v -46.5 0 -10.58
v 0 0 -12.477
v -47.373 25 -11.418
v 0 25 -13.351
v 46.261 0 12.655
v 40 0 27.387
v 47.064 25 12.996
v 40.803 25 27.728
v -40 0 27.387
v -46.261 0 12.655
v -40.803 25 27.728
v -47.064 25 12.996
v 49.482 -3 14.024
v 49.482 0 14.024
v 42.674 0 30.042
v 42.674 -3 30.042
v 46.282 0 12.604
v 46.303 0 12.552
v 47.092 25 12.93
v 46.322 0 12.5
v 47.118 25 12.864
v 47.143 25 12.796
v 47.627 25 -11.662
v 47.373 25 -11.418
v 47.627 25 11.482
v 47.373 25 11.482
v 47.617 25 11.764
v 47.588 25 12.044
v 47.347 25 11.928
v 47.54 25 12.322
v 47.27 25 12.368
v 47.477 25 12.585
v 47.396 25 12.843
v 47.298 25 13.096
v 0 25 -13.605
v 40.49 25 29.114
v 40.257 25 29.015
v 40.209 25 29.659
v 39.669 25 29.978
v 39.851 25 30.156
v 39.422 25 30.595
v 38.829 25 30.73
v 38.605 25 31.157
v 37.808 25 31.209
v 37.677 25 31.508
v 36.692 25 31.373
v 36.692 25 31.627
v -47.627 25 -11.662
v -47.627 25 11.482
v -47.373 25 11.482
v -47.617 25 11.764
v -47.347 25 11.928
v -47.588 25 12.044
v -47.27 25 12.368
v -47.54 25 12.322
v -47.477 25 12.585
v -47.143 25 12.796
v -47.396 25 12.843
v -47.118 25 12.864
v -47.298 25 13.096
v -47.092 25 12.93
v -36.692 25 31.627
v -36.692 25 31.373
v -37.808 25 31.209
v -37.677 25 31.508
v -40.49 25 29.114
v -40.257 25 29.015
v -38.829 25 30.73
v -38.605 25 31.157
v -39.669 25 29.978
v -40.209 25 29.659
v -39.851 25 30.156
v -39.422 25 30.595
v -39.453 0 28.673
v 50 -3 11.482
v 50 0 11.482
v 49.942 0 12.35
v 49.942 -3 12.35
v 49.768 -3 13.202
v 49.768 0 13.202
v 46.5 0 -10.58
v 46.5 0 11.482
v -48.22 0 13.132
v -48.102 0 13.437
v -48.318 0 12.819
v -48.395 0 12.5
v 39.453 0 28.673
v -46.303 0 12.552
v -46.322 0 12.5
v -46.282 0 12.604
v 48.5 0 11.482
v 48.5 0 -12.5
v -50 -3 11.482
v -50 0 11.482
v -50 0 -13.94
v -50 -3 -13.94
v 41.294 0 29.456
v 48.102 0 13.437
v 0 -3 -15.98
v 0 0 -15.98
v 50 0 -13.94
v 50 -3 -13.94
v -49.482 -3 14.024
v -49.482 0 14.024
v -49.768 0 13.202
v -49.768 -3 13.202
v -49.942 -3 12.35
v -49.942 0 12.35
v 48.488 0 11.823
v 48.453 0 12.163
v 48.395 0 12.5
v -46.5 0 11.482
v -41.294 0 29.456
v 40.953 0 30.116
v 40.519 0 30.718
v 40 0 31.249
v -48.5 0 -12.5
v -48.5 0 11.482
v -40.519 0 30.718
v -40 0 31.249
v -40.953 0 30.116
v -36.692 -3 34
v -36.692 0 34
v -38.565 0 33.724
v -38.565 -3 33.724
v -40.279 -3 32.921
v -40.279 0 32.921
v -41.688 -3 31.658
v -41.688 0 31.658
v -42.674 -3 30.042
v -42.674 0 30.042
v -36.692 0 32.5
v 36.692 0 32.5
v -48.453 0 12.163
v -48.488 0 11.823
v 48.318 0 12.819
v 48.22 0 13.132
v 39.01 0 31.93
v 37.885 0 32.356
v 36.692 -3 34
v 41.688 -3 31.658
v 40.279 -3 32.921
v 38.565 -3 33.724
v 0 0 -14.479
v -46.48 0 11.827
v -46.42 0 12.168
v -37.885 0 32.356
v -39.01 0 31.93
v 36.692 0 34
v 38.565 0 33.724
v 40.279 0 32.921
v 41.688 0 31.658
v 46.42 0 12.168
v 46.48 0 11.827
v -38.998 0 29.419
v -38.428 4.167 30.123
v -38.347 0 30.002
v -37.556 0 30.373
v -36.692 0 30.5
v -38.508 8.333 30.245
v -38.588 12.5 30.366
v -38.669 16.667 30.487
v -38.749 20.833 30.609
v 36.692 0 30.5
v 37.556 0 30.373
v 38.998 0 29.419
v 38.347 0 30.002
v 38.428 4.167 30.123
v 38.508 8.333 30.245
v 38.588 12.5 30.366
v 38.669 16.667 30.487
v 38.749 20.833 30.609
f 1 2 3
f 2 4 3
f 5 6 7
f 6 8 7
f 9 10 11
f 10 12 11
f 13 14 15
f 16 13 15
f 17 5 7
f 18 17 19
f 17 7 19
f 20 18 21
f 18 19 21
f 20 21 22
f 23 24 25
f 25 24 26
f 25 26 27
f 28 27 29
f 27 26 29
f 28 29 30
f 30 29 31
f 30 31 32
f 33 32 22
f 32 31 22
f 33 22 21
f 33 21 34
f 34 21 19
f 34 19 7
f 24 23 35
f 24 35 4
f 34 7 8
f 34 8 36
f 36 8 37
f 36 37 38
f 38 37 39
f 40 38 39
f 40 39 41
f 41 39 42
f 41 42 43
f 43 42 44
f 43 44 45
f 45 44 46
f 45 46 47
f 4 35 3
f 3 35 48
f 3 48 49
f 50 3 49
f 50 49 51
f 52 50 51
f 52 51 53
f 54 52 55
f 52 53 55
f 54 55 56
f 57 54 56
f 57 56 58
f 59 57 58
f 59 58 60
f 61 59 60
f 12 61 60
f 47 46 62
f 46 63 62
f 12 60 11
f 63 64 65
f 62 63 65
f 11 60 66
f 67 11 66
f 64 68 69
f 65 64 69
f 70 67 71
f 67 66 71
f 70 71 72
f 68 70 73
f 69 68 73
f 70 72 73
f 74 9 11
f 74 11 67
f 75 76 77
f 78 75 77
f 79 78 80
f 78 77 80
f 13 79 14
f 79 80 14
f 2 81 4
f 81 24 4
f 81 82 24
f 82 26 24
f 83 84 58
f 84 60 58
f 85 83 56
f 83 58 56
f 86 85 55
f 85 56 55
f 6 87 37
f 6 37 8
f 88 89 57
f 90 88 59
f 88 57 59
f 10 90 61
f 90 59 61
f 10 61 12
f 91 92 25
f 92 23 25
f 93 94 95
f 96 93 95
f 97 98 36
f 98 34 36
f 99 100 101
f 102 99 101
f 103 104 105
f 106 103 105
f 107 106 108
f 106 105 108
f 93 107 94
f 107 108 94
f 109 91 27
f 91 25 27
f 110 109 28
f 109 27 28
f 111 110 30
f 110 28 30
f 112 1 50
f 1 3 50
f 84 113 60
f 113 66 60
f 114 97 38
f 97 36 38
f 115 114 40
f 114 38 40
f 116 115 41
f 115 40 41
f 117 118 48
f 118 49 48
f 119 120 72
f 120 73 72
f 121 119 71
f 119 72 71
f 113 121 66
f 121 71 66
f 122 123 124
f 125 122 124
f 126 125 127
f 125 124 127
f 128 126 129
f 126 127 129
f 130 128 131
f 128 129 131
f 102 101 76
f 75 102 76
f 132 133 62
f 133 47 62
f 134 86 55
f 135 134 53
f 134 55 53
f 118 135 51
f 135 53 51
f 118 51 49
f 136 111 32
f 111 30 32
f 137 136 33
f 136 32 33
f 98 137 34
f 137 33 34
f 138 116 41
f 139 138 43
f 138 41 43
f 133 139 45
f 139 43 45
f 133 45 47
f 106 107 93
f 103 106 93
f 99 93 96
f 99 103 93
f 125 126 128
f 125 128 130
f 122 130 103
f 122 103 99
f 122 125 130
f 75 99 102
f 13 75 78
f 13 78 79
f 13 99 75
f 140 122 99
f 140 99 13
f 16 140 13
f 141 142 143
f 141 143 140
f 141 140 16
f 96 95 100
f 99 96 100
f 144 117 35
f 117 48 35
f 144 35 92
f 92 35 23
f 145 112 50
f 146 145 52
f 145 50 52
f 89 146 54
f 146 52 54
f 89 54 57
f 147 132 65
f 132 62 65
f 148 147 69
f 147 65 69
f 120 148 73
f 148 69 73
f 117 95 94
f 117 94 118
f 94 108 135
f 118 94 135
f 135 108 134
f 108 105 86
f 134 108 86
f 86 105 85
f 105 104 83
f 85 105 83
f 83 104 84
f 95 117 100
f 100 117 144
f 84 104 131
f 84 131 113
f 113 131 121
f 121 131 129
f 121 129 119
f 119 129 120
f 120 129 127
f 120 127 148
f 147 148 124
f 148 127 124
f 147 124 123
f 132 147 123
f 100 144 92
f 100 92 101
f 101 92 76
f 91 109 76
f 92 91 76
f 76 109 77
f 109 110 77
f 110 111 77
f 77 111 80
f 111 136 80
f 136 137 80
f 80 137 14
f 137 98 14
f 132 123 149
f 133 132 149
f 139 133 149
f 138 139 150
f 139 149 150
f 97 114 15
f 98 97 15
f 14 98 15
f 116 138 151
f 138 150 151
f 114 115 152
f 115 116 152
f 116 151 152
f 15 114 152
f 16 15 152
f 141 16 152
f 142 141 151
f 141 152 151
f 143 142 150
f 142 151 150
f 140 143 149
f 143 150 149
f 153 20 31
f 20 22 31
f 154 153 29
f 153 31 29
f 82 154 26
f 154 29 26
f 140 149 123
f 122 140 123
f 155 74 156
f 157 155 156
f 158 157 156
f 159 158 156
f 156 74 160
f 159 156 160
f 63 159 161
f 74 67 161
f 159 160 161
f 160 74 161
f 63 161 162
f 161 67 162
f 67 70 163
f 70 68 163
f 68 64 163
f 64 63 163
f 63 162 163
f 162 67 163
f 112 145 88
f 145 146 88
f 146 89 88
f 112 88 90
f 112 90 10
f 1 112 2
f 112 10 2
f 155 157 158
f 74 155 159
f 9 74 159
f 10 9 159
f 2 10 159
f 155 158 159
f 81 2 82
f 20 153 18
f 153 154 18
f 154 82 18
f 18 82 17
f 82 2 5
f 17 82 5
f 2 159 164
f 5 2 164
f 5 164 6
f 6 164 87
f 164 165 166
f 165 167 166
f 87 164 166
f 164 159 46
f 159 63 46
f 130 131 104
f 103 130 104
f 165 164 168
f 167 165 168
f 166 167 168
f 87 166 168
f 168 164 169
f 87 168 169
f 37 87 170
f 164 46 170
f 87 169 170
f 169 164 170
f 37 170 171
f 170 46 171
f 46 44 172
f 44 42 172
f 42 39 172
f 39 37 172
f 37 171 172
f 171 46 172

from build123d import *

# Parameters (mm, degrees)
F1_DEPTH = 3
F2_DEPTH = 25
F2_TAPER = 2


with BuildPart() as f1:
    # F0 (on Front) → F1 (new body)
    with BuildSketch(Plane.XZ):
        with BuildLine():
            Line((-50, -13.9400455604), (0, -15.9801289749))
            Line((0, -15.9801289749), (50, -13.9400455604))
            Line((50, -13.9400455604), (50, 11.4815801105))
            ThreePointArc((50, 11.4815801105), (49.8692221387, 12.7788886118), (49.48215097, 14.0239942728))
            Line((49.48215097, 14.0239942728), (42.674322517, 30.0424141622))
            ThreePointArc((42.674322517, 30.0424141622), (40.2785560736, 32.9210558037), (36.692171547, 34))
            Line((36.692171547, 34), (-36.692171547, 34))
            ThreePointArc((-36.692171547, 34), (-40.2785560736, 32.9210558037), (-42.674322517, 30.0424141622))
            Line((-42.674322517, 30.0424141622), (-49.48215097, 14.0239942728))
            ThreePointArc((-49.48215097, 14.0239942728), (-49.8692221387, 12.7788886118), (-50, 11.4815801105))
            Line((-50, 11.4815801105), (-50, -13.9400455604))
        make_face()
        with BuildLine():
            Line((48.5, 11.4815801105), (48.5, -12.5))
            Line((48.5, -12.5), (0, -14.4788809121))
            Line((0, -14.4788809121), (-48.5, -12.5))
            Line((-48.5, -12.5), (-48.5, 11.4815801105))
            ThreePointArc((-48.5, 11.4815801105), (-48.4737268325, 11.9934799011), (-48.3951834418, 12.5))
            ThreePointArc((-48.3951834418, 12.5), (-48.2714890929, 12.9758665077), (-48.1016545923, 13.4372833123))
            Line((-48.1016545923, 13.4372833123), (-41.2938261393, 29.4557032017))
            ThreePointArc((-41.2938261393, 29.4557032017), (-40.7473349126, 30.4250042869), (-40, 31.249436081))
            ThreePointArc((-40, 31.249436081), (-38.4603372059, 32.1769210173), (-36.692171547, 32.5))
            Line((-36.692171547, 32.5), (0, 32.5))
            Line((0, 32.5), (36.692171547, 32.5))
            ThreePointArc((36.692171547, 32.5), (38.4603372059, 32.1769210173), (40, 31.249436081))
            ThreePointArc((40, 31.249436081), (40.7473349126, 30.4250042869), (41.2938261393, 29.4557032017))
            Line((41.2938261393, 29.4557032017), (48.1016545923, 13.4372833123))
            ThreePointArc((48.1016545923, 13.4372833123), (48.2714890929, 12.9758665077), (48.3951834418, 12.5))
            ThreePointArc((48.3951834418, 12.5), (48.4737268325, 11.9934799011), (48.5, 11.4815801105))
        make_face(mode=Mode.SUBTRACT)
        with BuildLine():
            Line((0, 12.5), (0, -12.4772168282))
            Line((0, -12.4772168282), (46.5, -10.5799392527))
            Line((46.5, -10.5799392527), (46.5, 11.4815801105))
            ThreePointArc((46.5, 11.4815801105), (46.4551261591, 11.9985224514), (46.3218470775, 12.5))
            Line((46.3218470775, 12.5), (40, 12.5))
            Line((40, 12.5), (0, 12.5))
        make_face()
        with BuildLine():
            Line((-46.5, -10.5799392527), (0, -12.4772168282))
            Line((0, -12.4772168282), (0, 12.5))
            Line((0, 12.5), (-40, 12.5))
            Line((-40, 12.5), (-46.3218470775, 12.5))
            ThreePointArc((-46.3218470775, 12.5), (-46.4551261591, 11.9985224514), (-46.5, 11.4815801105))
            Line((-46.5, 11.4815801105), (-46.5, -10.5799392527))
        make_face()
        with BuildLine():
            Line((-40, 12.5), (0, 12.5))
            Line((0, 12.5), (0, 30.5))
            Line((0, 30.5), (-36.692171547, 30.5))
            ThreePointArc((-36.692171547, 30.5), (-38.3474259439, 30.0020257556), (-39.4531643024, 28.673421921))
            Line((-39.4531643024, 28.673421921), (-40, 27.3867496913))
            Line((-40, 27.3867496913), (-40, 12.5))
        make_face()
        with BuildLine():
            Line((0, 30.5), (0, 12.5))
            Line((0, 12.5), (40, 12.5))
            Line((40, 12.5), (40, 27.3867496913))
            Line((40, 27.3867496913), (39.4531643024, 28.673421921))
            ThreePointArc((39.4531643024, 28.673421921), (38.3474259439, 30.0020257556), (36.692171547, 30.5))
            Line((36.692171547, 30.5), (0, 30.5))
        make_face()
        with BuildLine():
            Line((0, -12.5), (48.5, -12.5))
            Line((48.5, -12.5), (48.5, 11.4815801105))
            ThreePointArc((48.5, 11.4815801105), (48.4737268325, 11.9934799011), (48.3951834418, 12.5))
            Line((48.3951834418, 12.5), (46.3218470775, 12.5))
            ThreePointArc((46.3218470775, 12.5), (46.4551261591, 11.9985224514), (46.5, 11.4815801105))
            Line((46.5, 11.4815801105), (46.5, -10.5799392527))
            Line((46.5, -10.5799392527), (0, -12.4772168282))
            Line((0, -12.4772168282), (0, -12.5))
        make_face()
        with BuildLine():
            Line((-48.5, -12.5), (0, -12.5))
            Line((0, -12.5), (0, -12.4772168282))
            Line((0, -12.4772168282), (-46.5, -10.5799392527))
            Line((-46.5, -10.5799392527), (-46.5, 11.4815801105))
            ThreePointArc((-46.5, 11.4815801105), (-46.4551261591, 11.9985224514), (-46.3218470775, 12.5))
            Line((-46.3218470775, 12.5), (-48.3951834418, 12.5))
            ThreePointArc((-48.3951834418, 12.5), (-48.4737268325, 11.9934799011), (-48.5, 11.4815801105))
            Line((-48.5, 11.4815801105), (-48.5, -12.5))
        make_face()
        with BuildLine():
            Line((0, 32.5), (0, 30.5))
            Line((0, 30.5), (36.692171547, 30.5))
            ThreePointArc((36.692171547, 30.5), (38.3474259439, 30.0020257556), (39.4531643024, 28.673421921))
            Line((39.4531643024, 28.673421921), (40, 27.3867496913))
            Line((40, 27.3867496913), (40, 31.249436081))
            ThreePointArc((40, 31.249436081), (38.4603372059, 32.1769210173), (36.692171547, 32.5))
            Line((36.692171547, 32.5), (0, 32.5))
        make_face()
        with BuildLine():
            Line((-36.692171547, 30.5), (0, 30.5))
            Line((0, 30.5), (0, 32.5))
            Line((0, 32.5), (-36.692171547, 32.5))
            ThreePointArc((-36.692171547, 32.5), (-38.4603372059, 32.1769210173), (-40, 31.249436081))
            Line((-40, 31.249436081), (-40, 27.3867496913))
            Line((-40, 27.3867496913), (-39.4531643024, 28.673421921))
            ThreePointArc((-39.4531643024, 28.673421921), (-38.3474259439, 30.0020257556), (-36.692171547, 30.5))
        make_face()
        Polygon((0, -14.4788809121), (48.5, -12.5), (0, -12.5), align=None)
        Polygon((0, -14.4788809121), (0, -12.5), (-48.5, -12.5), align=None)
        with BuildLine():
            Line((-46.3218470775, 12.5), (-40, 12.5))
            Line((-40, 12.5), (-40, 27.3867496913))
            Line((-40, 27.3867496913), (-46.2609927554, 12.6550020316))
            ThreePointArc((-46.2609927554, 12.6550020316), (-46.2924955787, 12.5779233244), (-46.3218470775, 12.5))
        make_face()
        with BuildLine():
            Line((40, 12.5), (46.3218470775, 12.5))
            ThreePointArc((46.3218470775, 12.5), (46.2924955787, 12.5779233244), (46.2609927554, 12.6550020316))
            Line((46.2609927554, 12.6550020316), (40, 27.3867496913))
            Line((40, 27.3867496913), (40, 12.5))
        make_face()
        with BuildLine():
            ThreePointArc((-48.1016545923, 13.4372833123), (-48.2714890929, 12.9758665077), (-48.3951834418, 12.5))
            Line((-48.3951834418, 12.5), (-46.3218470775, 12.5))
            ThreePointArc((-46.3218470775, 12.5), (-46.2924955787, 12.5779233244), (-46.2609927554, 12.6550020316))
            Line((-46.2609927554, 12.6550020316), (-40, 27.3867496913))
            Line((-40, 27.3867496913), (-40, 31.249436081))
            ThreePointArc((-40, 31.249436081), (-40.7473349126, 30.4250042869), (-41.2938261393, 29.4557032017))
            Line((-41.2938261393, 29.4557032017), (-48.1016545923, 13.4372833123))
        make_face()
        with BuildLine():
            Line((46.3218470775, 12.5), (48.3951834418, 12.5))
            ThreePointArc((48.3951834418, 12.5), (48.2714890929, 12.9758665077), (48.1016545923, 13.4372833123))
            Line((48.1016545923, 13.4372833123), (41.2938261393, 29.4557032017))
            ThreePointArc((41.2938261393, 29.4557032017), (40.7473349126, 30.4250042869), (40, 31.249436081))
            Line((40, 31.249436081), (40, 27.3867496913))
            Line((40, 27.3867496913), (46.2609927554, 12.6550020316))
            ThreePointArc((46.2609927554, 12.6550020316), (46.2924955787, 12.5779233244), (46.3218470775, 12.5))
        make_face()
    extrude(amount=F1_DEPTH)

    # F0 (on Front) → F2 (join)
    with BuildSketch(Plane.XZ):
        with BuildLine():
            Line((-36.692171547, 30.5), (0, 30.5))
            Line((0, 30.5), (0, 32.5))
            Line((0, 32.5), (-36.692171547, 32.5))
            ThreePointArc((-36.692171547, 32.5), (-38.4603372059, 32.1769210173), (-40, 31.249436081))
            Line((-40, 31.249436081), (-40, 27.3867496913))
            Line((-40, 27.3867496913), (-39.4531643024, 28.673421921))
            ThreePointArc((-39.4531643024, 28.673421921), (-38.3474259439, 30.0020257556), (-36.692171547, 30.5))
        make_face()
        with BuildLine():
            ThreePointArc((-48.1016545923, 13.4372833123), (-48.2714890929, 12.9758665077), (-48.3951834418, 12.5))
            Line((-48.3951834418, 12.5), (-46.3218470775, 12.5))
            ThreePointArc((-46.3218470775, 12.5), (-46.2924955787, 12.5779233244), (-46.2609927554, 12.6550020316))
            Line((-46.2609927554, 12.6550020316), (-40, 27.3867496913))
            Line((-40, 27.3867496913), (-40, 31.249436081))
            ThreePointArc((-40, 31.249436081), (-40.7473349126, 30.4250042869), (-41.2938261393, 29.4557032017))
            Line((-41.2938261393, 29.4557032017), (-48.1016545923, 13.4372833123))
        make_face()
        with BuildLine():
            Line((-48.5, -12.5), (0, -12.5))
            Line((0, -12.5), (0, -12.4772168282))
            Line((0, -12.4772168282), (-46.5, -10.5799392527))
            Line((-46.5, -10.5799392527), (-46.5, 11.4815801105))
            ThreePointArc((-46.5, 11.4815801105), (-46.4551261591, 11.9985224514), (-46.3218470775, 12.5))
            Line((-46.3218470775, 12.5), (-48.3951834418, 12.5))
            ThreePointArc((-48.3951834418, 12.5), (-48.4737268325, 11.9934799011), (-48.5, 11.4815801105))
            Line((-48.5, 11.4815801105), (-48.5, -12.5))
        make_face()
        Polygon((0, -14.4788809121), (0, -12.5), (-48.5, -12.5), align=None)
        Polygon((0, -14.4788809121), (48.5, -12.5), (0, -12.5), align=None)
        with BuildLine():
            Line((0, -12.5), (48.5, -12.5))
            Line((48.5, -12.5), (48.5, 11.4815801105))
            ThreePointArc((48.5, 11.4815801105), (48.4737268325, 11.9934799011), (48.3951834418, 12.5))
            Line((48.3951834418, 12.5), (46.3218470775, 12.5))
            ThreePointArc((46.3218470775, 12.5), (46.4551261591, 11.9985224514), (46.5, 11.4815801105))
            Line((46.5, 11.4815801105), (46.5, -10.5799392527))
            Line((46.5, -10.5799392527), (0, -12.4772168282))
            Line((0, -12.4772168282), (0, -12.5))
        make_face()
        with BuildLine():
            Line((46.3218470775, 12.5), (48.3951834418, 12.5))
            ThreePointArc((48.3951834418, 12.5), (48.2714890929, 12.9758665077), (48.1016545923, 13.4372833123))
            Line((48.1016545923, 13.4372833123), (41.2938261393, 29.4557032017))
            ThreePointArc((41.2938261393, 29.4557032017), (40.7473349126, 30.4250042869), (40, 31.249436081))
            Line((40, 31.249436081), (40, 27.3867496913))
            Line((40, 27.3867496913), (46.2609927554, 12.6550020316))
            ThreePointArc((46.2609927554, 12.6550020316), (46.2924955787, 12.5779233244), (46.3218470775, 12.5))
        make_face()
        with BuildLine():
            Line((0, 32.5), (0, 30.5))
            Line((0, 30.5), (36.692171547, 30.5))
            ThreePointArc((36.692171547, 30.5), (38.3474259439, 30.0020257556), (39.4531643024, 28.673421921))
            Line((39.4531643024, 28.673421921), (40, 27.3867496913))
            Line((40, 27.3867496913), (40, 31.249436081))
            ThreePointArc((40, 31.249436081), (38.4603372059, 32.1769210173), (36.692171547, 32.5))
            Line((36.692171547, 32.5), (0, 32.5))
        make_face()
    extrude(amount=-F2_DEPTH, taper=F2_TAPER)


solid = f1.part
